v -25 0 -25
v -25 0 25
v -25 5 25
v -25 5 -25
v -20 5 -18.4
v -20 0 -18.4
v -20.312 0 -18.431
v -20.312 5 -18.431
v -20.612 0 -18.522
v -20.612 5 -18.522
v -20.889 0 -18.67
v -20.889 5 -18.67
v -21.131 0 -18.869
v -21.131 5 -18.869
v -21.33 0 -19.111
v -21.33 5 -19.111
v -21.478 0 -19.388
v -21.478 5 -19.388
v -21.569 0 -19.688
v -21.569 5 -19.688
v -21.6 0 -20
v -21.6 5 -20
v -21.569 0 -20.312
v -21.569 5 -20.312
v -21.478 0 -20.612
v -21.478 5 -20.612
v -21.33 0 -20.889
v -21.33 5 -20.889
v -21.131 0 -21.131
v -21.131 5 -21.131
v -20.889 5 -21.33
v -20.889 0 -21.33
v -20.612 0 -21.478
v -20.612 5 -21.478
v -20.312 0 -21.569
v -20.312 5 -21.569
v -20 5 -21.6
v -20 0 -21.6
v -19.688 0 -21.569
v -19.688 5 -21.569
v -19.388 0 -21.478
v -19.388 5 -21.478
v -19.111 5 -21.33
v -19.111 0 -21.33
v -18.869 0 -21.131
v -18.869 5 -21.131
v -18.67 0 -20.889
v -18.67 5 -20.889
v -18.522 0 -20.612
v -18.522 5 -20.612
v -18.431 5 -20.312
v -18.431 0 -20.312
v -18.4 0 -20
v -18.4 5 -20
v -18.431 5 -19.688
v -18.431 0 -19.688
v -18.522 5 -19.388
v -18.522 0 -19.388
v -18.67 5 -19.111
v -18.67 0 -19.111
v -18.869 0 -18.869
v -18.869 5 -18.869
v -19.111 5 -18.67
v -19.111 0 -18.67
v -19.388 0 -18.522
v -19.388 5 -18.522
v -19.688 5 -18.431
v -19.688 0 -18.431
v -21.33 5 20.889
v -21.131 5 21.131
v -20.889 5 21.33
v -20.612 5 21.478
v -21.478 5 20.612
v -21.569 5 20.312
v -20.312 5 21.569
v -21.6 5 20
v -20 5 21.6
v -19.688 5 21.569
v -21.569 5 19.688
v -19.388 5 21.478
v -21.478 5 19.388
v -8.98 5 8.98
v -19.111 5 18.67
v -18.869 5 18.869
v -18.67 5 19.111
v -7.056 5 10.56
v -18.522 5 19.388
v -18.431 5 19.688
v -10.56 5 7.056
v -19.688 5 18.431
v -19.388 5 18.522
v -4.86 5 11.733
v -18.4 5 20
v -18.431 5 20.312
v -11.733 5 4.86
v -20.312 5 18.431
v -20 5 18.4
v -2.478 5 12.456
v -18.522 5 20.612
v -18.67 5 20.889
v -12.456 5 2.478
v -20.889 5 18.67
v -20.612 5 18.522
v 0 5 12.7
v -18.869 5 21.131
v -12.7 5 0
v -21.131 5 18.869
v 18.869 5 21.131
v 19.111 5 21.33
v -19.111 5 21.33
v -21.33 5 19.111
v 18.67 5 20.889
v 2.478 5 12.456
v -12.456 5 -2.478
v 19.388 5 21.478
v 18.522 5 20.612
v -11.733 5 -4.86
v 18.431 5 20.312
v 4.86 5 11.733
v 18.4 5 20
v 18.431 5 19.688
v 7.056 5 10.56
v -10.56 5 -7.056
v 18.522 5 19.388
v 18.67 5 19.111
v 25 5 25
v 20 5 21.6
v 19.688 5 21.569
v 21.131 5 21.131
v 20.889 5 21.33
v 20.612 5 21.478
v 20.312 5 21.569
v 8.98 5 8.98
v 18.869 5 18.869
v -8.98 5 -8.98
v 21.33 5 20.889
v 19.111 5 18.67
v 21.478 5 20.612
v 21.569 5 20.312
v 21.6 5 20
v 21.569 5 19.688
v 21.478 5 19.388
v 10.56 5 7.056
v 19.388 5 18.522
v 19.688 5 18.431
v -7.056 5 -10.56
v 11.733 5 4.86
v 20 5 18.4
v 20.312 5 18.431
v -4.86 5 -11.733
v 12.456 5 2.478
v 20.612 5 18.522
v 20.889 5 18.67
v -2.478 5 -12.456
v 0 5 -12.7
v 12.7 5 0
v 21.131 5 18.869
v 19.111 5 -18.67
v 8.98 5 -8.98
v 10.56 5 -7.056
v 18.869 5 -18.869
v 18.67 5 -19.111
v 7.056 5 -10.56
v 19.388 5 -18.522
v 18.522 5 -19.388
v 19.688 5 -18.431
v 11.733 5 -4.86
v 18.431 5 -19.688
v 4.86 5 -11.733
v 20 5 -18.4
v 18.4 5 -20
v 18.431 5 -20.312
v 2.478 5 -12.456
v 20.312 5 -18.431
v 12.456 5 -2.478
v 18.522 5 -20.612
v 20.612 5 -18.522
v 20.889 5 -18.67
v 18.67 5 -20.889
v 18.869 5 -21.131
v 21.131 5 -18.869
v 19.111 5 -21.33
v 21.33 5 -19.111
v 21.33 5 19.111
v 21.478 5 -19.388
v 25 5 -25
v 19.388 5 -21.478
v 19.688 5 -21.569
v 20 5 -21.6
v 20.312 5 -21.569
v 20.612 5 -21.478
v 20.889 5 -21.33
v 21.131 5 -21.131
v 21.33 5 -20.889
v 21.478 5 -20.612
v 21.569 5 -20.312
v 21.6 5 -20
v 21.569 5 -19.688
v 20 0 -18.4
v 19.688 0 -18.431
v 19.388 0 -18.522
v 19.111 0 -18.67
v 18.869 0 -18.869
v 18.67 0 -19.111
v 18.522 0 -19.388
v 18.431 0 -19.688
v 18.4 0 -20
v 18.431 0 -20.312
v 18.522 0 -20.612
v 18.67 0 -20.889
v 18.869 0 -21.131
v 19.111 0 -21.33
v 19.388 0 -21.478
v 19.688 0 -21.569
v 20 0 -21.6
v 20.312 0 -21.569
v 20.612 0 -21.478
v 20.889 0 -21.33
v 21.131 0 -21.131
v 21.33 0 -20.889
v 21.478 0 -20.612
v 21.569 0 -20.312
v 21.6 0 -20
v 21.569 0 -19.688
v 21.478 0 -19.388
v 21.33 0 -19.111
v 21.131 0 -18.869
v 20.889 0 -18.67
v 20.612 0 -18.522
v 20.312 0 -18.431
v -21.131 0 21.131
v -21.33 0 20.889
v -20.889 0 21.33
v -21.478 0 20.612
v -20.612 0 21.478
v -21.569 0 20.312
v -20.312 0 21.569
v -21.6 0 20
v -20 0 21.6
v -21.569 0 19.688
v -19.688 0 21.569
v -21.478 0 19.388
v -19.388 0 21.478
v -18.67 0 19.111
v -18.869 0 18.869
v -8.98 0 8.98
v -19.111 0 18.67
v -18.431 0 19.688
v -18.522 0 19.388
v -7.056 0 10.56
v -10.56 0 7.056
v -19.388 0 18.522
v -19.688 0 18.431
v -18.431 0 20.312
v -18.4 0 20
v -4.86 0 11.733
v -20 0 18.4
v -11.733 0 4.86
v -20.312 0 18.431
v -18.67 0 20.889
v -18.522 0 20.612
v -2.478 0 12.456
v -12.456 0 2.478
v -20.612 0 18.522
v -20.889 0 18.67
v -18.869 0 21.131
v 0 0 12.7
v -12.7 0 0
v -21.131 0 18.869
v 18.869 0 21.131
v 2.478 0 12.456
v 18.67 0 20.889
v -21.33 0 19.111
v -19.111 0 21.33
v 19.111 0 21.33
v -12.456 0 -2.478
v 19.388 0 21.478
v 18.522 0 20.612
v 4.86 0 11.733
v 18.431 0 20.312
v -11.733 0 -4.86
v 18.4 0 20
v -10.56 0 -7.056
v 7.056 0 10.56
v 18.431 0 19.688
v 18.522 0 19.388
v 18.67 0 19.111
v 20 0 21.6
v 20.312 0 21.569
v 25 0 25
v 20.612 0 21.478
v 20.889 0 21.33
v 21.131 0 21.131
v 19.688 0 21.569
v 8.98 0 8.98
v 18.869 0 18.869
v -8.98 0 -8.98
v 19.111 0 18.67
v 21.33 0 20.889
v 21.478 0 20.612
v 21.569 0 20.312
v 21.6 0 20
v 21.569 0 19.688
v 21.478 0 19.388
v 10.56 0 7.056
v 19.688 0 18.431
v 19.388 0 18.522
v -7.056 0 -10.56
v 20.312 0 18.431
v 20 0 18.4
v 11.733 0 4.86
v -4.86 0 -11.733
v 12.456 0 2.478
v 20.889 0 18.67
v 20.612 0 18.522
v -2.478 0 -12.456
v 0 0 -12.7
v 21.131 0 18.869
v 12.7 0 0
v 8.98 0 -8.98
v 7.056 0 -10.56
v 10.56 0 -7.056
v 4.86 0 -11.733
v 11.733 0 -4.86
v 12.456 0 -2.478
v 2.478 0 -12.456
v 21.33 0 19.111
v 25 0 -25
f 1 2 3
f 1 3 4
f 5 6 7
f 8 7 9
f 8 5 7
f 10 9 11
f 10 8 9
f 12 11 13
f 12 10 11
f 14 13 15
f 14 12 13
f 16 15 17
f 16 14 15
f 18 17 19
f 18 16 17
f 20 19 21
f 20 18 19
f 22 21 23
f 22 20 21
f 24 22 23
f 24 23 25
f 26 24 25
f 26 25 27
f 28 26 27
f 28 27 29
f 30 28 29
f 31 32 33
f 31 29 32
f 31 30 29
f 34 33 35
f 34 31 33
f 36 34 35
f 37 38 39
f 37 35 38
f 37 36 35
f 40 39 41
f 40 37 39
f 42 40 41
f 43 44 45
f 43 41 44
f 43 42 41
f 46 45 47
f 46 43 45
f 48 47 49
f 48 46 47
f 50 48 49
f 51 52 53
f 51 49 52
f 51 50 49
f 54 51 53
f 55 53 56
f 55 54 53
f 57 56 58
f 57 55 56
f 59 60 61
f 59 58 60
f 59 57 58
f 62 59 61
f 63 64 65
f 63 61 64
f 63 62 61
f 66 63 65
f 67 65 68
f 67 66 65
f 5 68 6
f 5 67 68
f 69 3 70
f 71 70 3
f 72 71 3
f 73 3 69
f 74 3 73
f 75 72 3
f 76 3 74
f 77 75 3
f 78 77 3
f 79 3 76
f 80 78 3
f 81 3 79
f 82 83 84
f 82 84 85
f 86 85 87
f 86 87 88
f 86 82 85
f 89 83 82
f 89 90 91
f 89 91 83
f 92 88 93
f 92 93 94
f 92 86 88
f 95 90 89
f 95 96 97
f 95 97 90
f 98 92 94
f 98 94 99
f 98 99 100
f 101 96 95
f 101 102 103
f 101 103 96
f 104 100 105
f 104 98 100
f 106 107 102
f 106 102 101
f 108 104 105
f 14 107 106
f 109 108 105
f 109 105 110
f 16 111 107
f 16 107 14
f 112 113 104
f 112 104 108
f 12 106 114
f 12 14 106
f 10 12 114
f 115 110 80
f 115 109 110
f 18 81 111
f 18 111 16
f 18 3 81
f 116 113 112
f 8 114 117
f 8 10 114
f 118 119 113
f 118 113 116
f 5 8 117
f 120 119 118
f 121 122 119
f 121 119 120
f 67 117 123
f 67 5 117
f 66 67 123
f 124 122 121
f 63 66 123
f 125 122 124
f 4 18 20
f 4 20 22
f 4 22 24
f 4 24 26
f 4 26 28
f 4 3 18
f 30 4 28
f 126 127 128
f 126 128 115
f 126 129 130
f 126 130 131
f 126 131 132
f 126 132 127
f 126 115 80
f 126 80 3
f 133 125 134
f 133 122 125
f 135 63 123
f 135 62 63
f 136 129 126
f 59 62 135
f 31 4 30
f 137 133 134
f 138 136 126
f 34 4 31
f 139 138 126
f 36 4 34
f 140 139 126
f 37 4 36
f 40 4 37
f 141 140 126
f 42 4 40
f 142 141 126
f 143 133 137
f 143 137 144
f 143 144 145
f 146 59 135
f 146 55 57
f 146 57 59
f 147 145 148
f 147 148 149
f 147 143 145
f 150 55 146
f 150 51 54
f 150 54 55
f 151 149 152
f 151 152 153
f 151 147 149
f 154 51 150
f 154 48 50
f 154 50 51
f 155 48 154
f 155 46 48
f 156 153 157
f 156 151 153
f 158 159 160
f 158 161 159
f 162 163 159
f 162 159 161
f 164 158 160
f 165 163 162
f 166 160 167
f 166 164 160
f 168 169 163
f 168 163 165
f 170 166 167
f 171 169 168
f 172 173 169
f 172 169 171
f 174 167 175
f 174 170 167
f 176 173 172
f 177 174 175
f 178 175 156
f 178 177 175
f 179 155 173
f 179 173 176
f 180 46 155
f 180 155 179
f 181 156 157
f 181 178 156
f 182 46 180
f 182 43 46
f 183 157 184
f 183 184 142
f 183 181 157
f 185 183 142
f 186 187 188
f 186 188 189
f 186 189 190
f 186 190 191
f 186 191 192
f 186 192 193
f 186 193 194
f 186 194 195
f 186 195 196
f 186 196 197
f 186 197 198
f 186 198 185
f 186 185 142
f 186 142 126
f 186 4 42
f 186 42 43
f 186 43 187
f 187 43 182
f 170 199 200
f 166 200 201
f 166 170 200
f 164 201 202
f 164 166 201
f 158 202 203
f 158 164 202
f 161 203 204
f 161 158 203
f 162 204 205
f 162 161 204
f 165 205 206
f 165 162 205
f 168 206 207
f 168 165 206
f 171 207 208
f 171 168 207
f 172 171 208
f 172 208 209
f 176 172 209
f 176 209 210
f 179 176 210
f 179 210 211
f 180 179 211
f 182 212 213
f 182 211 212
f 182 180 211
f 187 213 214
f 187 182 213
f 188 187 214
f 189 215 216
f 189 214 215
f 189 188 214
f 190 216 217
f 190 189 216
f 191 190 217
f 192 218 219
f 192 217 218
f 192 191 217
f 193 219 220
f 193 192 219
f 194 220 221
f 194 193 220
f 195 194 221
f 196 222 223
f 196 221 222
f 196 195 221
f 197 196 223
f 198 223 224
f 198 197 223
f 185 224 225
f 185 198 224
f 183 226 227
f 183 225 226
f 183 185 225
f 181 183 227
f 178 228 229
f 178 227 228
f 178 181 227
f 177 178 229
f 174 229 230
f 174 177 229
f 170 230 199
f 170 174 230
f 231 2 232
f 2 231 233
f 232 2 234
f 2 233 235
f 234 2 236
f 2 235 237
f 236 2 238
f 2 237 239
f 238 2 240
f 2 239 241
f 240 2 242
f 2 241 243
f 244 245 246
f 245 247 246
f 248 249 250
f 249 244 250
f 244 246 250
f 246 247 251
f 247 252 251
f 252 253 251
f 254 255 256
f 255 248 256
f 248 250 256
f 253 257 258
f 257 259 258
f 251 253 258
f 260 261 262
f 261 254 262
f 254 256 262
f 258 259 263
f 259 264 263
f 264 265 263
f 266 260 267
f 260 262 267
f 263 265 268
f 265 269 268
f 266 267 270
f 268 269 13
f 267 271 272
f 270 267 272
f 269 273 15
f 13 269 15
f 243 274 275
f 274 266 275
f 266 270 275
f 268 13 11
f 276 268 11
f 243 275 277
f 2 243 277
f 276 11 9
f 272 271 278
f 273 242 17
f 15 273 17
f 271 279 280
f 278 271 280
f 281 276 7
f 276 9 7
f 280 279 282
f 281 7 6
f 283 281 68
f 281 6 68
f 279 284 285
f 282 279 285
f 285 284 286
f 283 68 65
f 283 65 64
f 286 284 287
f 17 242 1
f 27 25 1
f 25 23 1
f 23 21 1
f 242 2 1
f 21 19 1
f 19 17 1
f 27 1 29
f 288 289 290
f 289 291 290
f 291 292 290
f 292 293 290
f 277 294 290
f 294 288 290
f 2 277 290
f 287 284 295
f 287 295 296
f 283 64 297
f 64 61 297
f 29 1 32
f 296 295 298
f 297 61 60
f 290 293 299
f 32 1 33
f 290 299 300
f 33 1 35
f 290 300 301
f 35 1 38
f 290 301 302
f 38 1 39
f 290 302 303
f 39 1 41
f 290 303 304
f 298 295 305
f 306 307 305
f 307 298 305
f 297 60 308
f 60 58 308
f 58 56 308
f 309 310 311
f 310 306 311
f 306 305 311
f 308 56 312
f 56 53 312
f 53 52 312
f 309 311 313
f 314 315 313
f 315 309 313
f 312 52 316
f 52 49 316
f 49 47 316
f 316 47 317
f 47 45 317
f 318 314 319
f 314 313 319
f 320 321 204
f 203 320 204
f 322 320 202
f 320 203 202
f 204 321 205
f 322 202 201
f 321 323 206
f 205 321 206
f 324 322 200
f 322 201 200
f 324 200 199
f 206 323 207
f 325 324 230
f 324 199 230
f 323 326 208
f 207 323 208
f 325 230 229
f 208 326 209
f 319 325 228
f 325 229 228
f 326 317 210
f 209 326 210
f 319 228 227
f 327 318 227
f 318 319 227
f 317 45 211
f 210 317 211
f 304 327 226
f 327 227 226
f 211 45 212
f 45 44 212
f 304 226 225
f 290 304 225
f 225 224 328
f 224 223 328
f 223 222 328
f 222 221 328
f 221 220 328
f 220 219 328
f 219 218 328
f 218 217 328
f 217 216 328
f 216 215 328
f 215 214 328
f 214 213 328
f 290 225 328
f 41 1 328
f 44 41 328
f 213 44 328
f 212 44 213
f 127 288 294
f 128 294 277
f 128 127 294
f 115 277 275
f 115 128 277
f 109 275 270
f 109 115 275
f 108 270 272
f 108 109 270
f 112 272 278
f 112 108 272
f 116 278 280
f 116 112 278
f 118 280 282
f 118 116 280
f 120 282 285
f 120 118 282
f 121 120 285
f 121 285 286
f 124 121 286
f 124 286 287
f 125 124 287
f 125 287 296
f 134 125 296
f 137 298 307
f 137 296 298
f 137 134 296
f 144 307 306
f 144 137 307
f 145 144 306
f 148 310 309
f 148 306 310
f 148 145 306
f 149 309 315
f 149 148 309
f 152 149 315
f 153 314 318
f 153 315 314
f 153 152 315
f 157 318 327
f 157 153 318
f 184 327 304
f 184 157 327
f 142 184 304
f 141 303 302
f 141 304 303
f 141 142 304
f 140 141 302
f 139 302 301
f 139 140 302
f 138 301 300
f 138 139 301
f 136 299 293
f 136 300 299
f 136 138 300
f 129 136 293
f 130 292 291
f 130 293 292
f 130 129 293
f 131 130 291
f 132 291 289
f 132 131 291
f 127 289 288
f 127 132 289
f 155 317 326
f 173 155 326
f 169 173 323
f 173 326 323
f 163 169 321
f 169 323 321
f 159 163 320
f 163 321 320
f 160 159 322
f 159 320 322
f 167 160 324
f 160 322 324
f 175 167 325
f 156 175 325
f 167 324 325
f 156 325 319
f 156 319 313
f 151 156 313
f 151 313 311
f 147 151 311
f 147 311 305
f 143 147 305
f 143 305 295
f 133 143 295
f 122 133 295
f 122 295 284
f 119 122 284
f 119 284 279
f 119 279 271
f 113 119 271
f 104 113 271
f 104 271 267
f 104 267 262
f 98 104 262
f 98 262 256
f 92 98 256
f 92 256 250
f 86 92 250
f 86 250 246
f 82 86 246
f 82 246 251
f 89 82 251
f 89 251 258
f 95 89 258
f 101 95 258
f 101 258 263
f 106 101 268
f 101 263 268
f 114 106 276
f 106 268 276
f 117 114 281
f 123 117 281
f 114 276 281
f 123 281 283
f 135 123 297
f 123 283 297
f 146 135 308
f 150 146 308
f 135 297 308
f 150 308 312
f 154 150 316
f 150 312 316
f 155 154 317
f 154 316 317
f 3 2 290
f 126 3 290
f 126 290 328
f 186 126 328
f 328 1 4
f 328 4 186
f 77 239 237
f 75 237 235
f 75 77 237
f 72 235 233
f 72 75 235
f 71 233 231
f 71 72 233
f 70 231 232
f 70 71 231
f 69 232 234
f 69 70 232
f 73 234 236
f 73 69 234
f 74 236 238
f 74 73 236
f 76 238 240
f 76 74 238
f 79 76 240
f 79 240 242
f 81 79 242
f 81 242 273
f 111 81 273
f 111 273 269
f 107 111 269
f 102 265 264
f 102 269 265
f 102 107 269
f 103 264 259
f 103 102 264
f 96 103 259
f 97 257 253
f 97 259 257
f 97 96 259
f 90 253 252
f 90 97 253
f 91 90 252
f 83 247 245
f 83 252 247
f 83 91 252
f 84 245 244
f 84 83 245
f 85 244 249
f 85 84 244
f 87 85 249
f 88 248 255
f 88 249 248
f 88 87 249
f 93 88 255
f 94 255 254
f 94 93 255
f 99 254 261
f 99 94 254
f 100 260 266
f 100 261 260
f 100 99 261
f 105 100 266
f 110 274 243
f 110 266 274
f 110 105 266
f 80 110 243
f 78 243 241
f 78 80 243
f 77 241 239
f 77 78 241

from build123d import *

# Parameters (mm, degrees)
SKETCH1_W                  = 50
SKETCH1_H                  = 50
EXTRUDE1_DEPTH             = 5
LPATTERN1_COUNT            = 2
LPATTERN1_PITCH            = 40
LPATTERN1_COUNT_DIR2       = 2
LPATTERN1_PITCH_DIR2       = 40
F_1_1_DIAMETER_HOLE1_D     = 25.4
F_1_1_DIAMETER_HOLE1_DEPTH = 6
F_1_1_DIAMETER_HOLE1_TIP   = 7.630929862


with BuildPart() as part:
    # Sketch1 → Extrude1 (new body)
    with BuildSketch(Plane(origin=(0, 0, 0), x_dir=(1, 0, 0), z_dir=(0, 1, 0))):
        Rectangle(SKETCH1_W, SKETCH1_H)
    extrude(amount=EXTRUDE1_DEPTH)

    # Sketch2 → M3 Clearance Hole1 (revolve, cut)
    with BuildSketch(Plane(origin=(-20, 5, 20), x_dir=(0, 0, 1), z_dir=(1, 0, 0))):
        Polygon((0, 0), (0, 6.96137699), (1.6, 6), (1.6, 0), align=None)
    m3_clearance_hole1 = revolve(axis=Axis((-20, 11.35, 20), (0, -1, 0)), mode=Mode.SUBTRACT)

    # LPattern1: M3 Clearance Hole1 2 × 2
    with Locations(*[(j * LPATTERN1_PITCH_DIR2, 0, -i * LPATTERN1_PITCH) for i in range(LPATTERN1_COUNT) for j in range(LPATTERN1_COUNT_DIR2) if (i, j) != (0, 0)]):
        add(m3_clearance_hole1, mode=Mode.SUBTRACT)

    # 1 (1) Diameter Hole1
    with Locations(Plane.ZX.offset(5)):
        with Locations((0, 0)):
            Hole(F_1_1_DIAMETER_HOLE1_D / 2, depth=F_1_1_DIAMETER_HOLE1_DEPTH)
            with Locations((0, 0, -(F_1_1_DIAMETER_HOLE1_DEPTH + F_1_1_DIAMETER_HOLE1_TIP / 2))):  # 118° drill point
                Cone(0, F_1_1_DIAMETER_HOLE1_D / 2, F_1_1_DIAMETER_HOLE1_TIP, mode=Mode.SUBTRACT)


solid = part.part
